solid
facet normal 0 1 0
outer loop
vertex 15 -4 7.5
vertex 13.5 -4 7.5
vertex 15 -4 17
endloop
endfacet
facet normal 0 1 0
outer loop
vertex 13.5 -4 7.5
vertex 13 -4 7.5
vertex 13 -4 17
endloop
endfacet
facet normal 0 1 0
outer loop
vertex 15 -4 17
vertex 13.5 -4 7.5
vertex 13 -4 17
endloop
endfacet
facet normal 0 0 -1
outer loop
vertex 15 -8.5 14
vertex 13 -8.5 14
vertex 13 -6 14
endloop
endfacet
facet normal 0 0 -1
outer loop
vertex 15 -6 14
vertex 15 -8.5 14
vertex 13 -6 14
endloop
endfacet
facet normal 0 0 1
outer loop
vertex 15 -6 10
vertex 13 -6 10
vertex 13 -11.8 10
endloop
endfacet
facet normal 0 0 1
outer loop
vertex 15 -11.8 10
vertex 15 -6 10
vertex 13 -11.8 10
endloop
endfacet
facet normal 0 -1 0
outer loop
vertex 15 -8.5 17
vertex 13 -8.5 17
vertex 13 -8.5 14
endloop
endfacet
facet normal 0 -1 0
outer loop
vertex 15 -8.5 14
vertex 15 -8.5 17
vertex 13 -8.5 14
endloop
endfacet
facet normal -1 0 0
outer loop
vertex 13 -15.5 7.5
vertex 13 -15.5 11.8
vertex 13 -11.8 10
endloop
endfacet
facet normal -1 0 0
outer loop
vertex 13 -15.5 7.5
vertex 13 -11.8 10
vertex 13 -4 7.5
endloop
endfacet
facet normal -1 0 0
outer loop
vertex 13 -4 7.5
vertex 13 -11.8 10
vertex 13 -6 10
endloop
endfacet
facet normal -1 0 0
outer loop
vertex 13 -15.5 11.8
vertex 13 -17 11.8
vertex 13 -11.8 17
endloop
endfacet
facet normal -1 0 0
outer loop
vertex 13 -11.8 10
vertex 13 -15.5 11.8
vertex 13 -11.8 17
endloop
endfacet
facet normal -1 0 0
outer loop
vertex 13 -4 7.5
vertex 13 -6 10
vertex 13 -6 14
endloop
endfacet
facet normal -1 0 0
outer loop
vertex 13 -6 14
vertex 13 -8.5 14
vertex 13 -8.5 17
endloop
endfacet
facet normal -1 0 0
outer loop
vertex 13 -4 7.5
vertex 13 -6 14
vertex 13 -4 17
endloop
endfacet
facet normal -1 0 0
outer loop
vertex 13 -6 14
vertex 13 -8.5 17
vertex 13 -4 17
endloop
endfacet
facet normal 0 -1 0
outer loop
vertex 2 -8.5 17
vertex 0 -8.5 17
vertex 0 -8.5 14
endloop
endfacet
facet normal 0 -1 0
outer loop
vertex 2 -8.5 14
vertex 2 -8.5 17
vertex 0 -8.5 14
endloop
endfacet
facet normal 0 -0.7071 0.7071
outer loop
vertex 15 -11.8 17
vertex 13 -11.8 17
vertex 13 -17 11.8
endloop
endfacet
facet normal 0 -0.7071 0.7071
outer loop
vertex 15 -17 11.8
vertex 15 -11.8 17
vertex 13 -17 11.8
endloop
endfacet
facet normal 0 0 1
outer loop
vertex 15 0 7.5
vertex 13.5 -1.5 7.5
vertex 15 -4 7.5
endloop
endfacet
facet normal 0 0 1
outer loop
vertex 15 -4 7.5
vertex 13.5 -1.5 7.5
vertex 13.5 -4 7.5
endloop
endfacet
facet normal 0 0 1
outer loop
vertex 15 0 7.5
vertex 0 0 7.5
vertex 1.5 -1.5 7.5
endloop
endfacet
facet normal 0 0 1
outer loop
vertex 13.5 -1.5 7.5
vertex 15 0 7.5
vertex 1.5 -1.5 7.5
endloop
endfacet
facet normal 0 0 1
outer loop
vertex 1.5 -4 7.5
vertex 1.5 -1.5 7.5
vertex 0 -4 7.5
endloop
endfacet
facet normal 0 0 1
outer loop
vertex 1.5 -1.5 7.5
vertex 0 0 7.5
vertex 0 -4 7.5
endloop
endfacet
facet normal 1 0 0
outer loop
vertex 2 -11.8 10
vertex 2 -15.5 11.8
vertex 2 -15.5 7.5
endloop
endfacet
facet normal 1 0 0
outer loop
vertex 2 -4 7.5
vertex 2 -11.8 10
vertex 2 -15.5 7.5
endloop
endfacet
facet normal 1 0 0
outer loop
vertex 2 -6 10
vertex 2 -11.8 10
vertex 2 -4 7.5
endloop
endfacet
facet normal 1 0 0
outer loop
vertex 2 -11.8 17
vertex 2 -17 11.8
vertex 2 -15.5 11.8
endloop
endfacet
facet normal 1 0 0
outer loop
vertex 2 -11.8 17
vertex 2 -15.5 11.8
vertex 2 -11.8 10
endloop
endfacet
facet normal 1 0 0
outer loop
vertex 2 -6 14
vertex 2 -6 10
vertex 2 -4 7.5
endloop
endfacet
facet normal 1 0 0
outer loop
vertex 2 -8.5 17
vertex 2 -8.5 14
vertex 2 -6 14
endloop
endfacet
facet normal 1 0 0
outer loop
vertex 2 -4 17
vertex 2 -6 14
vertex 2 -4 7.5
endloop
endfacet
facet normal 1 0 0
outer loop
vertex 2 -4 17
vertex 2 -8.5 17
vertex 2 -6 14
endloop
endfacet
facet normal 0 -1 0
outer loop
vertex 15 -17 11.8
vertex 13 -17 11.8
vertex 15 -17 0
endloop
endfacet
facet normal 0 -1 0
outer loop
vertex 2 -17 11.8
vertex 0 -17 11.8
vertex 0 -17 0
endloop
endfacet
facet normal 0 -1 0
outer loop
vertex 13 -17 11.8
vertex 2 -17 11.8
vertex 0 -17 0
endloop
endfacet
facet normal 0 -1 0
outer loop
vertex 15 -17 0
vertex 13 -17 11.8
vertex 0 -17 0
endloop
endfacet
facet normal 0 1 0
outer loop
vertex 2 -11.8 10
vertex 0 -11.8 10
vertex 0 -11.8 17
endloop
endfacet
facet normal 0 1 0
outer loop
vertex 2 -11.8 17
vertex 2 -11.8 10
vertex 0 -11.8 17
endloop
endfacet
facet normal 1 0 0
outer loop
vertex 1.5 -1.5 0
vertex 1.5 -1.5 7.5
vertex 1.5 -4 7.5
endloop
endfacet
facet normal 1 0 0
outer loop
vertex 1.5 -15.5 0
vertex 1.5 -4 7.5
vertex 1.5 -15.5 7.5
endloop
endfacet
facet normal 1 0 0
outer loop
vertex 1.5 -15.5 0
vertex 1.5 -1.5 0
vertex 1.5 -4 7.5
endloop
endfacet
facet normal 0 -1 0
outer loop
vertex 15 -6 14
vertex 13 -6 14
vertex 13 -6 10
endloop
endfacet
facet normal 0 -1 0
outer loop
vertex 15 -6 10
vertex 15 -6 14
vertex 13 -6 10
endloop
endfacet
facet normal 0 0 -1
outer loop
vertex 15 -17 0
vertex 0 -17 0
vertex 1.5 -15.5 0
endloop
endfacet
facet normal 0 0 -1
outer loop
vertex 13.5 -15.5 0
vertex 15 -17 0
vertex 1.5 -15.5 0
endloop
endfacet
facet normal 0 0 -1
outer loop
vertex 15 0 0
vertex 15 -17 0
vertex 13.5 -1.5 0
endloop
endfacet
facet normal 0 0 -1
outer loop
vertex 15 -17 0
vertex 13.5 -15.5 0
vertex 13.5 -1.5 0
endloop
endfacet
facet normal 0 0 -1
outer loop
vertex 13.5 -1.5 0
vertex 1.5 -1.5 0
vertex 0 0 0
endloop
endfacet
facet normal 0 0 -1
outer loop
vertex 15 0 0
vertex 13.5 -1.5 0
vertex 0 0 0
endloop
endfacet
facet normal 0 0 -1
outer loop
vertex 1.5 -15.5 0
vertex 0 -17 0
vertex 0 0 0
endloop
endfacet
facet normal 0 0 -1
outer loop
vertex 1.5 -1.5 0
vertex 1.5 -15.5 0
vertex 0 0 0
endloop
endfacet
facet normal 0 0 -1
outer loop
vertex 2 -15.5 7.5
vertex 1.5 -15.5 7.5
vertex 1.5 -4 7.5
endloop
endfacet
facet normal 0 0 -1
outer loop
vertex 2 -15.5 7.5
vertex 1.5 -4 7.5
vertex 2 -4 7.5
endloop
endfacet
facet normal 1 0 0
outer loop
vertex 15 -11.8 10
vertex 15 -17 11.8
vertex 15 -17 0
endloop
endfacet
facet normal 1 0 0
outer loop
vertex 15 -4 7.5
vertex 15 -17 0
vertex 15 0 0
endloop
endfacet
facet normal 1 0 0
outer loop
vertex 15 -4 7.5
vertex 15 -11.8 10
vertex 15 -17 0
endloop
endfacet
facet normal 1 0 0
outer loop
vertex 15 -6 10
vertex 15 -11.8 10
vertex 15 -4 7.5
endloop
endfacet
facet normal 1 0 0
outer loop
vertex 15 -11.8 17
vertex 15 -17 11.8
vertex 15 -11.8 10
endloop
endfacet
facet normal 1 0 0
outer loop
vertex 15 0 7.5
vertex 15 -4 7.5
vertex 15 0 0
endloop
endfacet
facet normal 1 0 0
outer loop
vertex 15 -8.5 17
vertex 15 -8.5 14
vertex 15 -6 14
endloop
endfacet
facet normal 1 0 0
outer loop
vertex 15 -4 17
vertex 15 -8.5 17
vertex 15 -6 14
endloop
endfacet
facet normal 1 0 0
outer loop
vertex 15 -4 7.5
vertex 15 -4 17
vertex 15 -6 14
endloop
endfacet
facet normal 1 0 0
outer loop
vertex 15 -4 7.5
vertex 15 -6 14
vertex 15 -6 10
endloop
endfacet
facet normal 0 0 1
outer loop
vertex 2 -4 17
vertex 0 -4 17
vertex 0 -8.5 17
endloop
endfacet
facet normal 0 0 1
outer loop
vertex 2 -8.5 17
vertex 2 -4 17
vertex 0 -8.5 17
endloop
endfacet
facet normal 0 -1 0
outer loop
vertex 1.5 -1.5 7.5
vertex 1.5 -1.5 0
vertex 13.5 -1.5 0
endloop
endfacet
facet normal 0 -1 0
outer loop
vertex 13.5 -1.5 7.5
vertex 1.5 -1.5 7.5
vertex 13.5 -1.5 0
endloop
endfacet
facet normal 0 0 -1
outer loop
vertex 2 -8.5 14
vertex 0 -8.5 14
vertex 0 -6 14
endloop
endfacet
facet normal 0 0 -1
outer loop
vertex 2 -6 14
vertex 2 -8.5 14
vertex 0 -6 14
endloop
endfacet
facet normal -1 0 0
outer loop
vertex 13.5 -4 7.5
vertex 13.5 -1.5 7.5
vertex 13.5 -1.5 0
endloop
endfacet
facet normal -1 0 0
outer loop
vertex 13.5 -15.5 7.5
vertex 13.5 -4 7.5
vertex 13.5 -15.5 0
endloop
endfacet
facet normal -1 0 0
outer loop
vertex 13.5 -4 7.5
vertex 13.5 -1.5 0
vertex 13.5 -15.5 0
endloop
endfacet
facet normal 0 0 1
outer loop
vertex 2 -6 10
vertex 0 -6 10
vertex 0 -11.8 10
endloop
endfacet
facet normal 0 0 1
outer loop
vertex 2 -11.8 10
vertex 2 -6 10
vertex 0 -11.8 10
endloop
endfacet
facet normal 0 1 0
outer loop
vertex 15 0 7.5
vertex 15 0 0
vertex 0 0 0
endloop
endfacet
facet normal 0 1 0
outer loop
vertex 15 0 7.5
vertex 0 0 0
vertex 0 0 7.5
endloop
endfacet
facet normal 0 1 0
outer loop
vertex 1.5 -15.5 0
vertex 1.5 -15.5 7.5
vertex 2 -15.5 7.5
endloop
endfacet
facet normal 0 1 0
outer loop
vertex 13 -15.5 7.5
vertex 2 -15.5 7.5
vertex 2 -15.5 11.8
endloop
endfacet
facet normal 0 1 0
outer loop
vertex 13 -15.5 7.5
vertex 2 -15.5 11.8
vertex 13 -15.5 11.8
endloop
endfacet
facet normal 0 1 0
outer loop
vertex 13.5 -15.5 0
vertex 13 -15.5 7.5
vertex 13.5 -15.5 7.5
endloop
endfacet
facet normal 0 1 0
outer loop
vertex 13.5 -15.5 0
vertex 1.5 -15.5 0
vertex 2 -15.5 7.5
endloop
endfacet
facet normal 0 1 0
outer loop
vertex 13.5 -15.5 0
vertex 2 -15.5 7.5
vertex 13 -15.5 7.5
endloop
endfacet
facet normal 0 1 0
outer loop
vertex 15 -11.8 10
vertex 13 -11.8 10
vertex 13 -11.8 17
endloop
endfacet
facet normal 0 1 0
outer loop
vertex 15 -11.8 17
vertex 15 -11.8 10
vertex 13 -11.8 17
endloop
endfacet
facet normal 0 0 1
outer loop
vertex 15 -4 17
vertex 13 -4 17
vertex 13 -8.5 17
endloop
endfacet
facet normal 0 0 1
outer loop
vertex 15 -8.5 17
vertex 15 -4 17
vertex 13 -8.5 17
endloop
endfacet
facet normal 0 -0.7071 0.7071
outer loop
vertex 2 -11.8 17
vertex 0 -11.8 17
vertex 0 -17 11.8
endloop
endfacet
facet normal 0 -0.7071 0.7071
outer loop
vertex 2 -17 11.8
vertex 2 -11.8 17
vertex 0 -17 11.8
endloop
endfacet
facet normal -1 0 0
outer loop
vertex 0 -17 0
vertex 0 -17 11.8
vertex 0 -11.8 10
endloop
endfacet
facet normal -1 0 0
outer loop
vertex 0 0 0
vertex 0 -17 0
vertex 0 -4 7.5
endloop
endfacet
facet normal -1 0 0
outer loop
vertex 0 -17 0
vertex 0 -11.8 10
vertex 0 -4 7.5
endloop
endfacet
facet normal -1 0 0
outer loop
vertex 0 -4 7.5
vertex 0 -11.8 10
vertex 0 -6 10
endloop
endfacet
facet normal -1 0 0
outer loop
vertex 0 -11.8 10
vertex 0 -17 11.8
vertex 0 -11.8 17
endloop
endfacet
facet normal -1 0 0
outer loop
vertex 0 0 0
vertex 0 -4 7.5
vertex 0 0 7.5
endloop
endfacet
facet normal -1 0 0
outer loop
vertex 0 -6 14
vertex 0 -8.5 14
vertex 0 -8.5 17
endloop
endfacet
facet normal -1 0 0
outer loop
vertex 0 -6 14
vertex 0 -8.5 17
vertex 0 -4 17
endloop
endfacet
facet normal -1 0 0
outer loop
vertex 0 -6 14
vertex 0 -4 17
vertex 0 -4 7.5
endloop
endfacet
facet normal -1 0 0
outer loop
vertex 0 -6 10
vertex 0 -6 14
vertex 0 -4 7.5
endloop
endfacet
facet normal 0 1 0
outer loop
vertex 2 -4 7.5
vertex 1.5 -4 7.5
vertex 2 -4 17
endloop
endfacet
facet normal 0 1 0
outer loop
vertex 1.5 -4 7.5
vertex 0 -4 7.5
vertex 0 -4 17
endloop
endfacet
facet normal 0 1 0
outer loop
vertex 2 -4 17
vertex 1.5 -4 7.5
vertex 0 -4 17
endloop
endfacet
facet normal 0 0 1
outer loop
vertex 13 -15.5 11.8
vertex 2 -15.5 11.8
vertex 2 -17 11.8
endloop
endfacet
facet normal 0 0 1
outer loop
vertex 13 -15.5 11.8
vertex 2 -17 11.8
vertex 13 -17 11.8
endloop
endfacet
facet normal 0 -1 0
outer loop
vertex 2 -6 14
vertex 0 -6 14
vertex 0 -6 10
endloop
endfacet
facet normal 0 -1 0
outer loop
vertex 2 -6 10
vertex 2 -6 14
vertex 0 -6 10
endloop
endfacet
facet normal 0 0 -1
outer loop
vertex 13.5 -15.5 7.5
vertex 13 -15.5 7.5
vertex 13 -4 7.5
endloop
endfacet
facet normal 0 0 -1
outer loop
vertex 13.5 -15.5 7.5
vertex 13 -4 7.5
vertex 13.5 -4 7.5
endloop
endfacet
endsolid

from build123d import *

# Parameters (mm, degrees)
F1_DEPTH = 15
F2_W     = 12
F2_H     = 14
F3_DEPTH = 7.5
F4_W     = 11
F4_H     = 14
F5_DEPTH = 17
F6_W     = 11
F6_H     = 1.5
F7_DEPTH = 5.2


with BuildPart() as f1:
    # F0 (on Right) → F1 (new body)
    with BuildSketch(Plane.YZ):
        Polygon((-17, 0), (0, 0), (0, 7.5), (-4, 7.5), (-4, 17), (-8.5, 17), (-8.5, 14), (-6, 14), (-6, 10), (-11.8, 10), (-11.8, 17), (-17, 11.8), align=None)
    extrude(amount=F1_DEPTH)

    # F2 (on face) → F3 (cut)
    with BuildSketch(Plane(origin=(0, 0, 0), x_dir=(1, 0, 0), z_dir=(0, 0, -1))):
        with Locations((7.5, 8.5)):
            Rectangle(F2_W, F2_H)
    extrude(amount=-F3_DEPTH, mode=Mode.SUBTRACT)

    # F4 (on face) → F5 (cut)
    with BuildSketch(Plane.XY.offset(17)):
        with Locations((7.5, -8.5)):
            Rectangle(F4_W, F4_H)
    extrude(amount=-F5_DEPTH, mode=Mode.SUBTRACT)

    # F6 (on face) → F7 (cut)
    with BuildSketch(Plane.XY.offset(17)):
        with Locations((7.5, -16.25)):
            Rectangle(F6_W, F6_H)
    extrude(amount=-F7_DEPTH, mode=Mode.SUBTRACT)


solid = f1.part
